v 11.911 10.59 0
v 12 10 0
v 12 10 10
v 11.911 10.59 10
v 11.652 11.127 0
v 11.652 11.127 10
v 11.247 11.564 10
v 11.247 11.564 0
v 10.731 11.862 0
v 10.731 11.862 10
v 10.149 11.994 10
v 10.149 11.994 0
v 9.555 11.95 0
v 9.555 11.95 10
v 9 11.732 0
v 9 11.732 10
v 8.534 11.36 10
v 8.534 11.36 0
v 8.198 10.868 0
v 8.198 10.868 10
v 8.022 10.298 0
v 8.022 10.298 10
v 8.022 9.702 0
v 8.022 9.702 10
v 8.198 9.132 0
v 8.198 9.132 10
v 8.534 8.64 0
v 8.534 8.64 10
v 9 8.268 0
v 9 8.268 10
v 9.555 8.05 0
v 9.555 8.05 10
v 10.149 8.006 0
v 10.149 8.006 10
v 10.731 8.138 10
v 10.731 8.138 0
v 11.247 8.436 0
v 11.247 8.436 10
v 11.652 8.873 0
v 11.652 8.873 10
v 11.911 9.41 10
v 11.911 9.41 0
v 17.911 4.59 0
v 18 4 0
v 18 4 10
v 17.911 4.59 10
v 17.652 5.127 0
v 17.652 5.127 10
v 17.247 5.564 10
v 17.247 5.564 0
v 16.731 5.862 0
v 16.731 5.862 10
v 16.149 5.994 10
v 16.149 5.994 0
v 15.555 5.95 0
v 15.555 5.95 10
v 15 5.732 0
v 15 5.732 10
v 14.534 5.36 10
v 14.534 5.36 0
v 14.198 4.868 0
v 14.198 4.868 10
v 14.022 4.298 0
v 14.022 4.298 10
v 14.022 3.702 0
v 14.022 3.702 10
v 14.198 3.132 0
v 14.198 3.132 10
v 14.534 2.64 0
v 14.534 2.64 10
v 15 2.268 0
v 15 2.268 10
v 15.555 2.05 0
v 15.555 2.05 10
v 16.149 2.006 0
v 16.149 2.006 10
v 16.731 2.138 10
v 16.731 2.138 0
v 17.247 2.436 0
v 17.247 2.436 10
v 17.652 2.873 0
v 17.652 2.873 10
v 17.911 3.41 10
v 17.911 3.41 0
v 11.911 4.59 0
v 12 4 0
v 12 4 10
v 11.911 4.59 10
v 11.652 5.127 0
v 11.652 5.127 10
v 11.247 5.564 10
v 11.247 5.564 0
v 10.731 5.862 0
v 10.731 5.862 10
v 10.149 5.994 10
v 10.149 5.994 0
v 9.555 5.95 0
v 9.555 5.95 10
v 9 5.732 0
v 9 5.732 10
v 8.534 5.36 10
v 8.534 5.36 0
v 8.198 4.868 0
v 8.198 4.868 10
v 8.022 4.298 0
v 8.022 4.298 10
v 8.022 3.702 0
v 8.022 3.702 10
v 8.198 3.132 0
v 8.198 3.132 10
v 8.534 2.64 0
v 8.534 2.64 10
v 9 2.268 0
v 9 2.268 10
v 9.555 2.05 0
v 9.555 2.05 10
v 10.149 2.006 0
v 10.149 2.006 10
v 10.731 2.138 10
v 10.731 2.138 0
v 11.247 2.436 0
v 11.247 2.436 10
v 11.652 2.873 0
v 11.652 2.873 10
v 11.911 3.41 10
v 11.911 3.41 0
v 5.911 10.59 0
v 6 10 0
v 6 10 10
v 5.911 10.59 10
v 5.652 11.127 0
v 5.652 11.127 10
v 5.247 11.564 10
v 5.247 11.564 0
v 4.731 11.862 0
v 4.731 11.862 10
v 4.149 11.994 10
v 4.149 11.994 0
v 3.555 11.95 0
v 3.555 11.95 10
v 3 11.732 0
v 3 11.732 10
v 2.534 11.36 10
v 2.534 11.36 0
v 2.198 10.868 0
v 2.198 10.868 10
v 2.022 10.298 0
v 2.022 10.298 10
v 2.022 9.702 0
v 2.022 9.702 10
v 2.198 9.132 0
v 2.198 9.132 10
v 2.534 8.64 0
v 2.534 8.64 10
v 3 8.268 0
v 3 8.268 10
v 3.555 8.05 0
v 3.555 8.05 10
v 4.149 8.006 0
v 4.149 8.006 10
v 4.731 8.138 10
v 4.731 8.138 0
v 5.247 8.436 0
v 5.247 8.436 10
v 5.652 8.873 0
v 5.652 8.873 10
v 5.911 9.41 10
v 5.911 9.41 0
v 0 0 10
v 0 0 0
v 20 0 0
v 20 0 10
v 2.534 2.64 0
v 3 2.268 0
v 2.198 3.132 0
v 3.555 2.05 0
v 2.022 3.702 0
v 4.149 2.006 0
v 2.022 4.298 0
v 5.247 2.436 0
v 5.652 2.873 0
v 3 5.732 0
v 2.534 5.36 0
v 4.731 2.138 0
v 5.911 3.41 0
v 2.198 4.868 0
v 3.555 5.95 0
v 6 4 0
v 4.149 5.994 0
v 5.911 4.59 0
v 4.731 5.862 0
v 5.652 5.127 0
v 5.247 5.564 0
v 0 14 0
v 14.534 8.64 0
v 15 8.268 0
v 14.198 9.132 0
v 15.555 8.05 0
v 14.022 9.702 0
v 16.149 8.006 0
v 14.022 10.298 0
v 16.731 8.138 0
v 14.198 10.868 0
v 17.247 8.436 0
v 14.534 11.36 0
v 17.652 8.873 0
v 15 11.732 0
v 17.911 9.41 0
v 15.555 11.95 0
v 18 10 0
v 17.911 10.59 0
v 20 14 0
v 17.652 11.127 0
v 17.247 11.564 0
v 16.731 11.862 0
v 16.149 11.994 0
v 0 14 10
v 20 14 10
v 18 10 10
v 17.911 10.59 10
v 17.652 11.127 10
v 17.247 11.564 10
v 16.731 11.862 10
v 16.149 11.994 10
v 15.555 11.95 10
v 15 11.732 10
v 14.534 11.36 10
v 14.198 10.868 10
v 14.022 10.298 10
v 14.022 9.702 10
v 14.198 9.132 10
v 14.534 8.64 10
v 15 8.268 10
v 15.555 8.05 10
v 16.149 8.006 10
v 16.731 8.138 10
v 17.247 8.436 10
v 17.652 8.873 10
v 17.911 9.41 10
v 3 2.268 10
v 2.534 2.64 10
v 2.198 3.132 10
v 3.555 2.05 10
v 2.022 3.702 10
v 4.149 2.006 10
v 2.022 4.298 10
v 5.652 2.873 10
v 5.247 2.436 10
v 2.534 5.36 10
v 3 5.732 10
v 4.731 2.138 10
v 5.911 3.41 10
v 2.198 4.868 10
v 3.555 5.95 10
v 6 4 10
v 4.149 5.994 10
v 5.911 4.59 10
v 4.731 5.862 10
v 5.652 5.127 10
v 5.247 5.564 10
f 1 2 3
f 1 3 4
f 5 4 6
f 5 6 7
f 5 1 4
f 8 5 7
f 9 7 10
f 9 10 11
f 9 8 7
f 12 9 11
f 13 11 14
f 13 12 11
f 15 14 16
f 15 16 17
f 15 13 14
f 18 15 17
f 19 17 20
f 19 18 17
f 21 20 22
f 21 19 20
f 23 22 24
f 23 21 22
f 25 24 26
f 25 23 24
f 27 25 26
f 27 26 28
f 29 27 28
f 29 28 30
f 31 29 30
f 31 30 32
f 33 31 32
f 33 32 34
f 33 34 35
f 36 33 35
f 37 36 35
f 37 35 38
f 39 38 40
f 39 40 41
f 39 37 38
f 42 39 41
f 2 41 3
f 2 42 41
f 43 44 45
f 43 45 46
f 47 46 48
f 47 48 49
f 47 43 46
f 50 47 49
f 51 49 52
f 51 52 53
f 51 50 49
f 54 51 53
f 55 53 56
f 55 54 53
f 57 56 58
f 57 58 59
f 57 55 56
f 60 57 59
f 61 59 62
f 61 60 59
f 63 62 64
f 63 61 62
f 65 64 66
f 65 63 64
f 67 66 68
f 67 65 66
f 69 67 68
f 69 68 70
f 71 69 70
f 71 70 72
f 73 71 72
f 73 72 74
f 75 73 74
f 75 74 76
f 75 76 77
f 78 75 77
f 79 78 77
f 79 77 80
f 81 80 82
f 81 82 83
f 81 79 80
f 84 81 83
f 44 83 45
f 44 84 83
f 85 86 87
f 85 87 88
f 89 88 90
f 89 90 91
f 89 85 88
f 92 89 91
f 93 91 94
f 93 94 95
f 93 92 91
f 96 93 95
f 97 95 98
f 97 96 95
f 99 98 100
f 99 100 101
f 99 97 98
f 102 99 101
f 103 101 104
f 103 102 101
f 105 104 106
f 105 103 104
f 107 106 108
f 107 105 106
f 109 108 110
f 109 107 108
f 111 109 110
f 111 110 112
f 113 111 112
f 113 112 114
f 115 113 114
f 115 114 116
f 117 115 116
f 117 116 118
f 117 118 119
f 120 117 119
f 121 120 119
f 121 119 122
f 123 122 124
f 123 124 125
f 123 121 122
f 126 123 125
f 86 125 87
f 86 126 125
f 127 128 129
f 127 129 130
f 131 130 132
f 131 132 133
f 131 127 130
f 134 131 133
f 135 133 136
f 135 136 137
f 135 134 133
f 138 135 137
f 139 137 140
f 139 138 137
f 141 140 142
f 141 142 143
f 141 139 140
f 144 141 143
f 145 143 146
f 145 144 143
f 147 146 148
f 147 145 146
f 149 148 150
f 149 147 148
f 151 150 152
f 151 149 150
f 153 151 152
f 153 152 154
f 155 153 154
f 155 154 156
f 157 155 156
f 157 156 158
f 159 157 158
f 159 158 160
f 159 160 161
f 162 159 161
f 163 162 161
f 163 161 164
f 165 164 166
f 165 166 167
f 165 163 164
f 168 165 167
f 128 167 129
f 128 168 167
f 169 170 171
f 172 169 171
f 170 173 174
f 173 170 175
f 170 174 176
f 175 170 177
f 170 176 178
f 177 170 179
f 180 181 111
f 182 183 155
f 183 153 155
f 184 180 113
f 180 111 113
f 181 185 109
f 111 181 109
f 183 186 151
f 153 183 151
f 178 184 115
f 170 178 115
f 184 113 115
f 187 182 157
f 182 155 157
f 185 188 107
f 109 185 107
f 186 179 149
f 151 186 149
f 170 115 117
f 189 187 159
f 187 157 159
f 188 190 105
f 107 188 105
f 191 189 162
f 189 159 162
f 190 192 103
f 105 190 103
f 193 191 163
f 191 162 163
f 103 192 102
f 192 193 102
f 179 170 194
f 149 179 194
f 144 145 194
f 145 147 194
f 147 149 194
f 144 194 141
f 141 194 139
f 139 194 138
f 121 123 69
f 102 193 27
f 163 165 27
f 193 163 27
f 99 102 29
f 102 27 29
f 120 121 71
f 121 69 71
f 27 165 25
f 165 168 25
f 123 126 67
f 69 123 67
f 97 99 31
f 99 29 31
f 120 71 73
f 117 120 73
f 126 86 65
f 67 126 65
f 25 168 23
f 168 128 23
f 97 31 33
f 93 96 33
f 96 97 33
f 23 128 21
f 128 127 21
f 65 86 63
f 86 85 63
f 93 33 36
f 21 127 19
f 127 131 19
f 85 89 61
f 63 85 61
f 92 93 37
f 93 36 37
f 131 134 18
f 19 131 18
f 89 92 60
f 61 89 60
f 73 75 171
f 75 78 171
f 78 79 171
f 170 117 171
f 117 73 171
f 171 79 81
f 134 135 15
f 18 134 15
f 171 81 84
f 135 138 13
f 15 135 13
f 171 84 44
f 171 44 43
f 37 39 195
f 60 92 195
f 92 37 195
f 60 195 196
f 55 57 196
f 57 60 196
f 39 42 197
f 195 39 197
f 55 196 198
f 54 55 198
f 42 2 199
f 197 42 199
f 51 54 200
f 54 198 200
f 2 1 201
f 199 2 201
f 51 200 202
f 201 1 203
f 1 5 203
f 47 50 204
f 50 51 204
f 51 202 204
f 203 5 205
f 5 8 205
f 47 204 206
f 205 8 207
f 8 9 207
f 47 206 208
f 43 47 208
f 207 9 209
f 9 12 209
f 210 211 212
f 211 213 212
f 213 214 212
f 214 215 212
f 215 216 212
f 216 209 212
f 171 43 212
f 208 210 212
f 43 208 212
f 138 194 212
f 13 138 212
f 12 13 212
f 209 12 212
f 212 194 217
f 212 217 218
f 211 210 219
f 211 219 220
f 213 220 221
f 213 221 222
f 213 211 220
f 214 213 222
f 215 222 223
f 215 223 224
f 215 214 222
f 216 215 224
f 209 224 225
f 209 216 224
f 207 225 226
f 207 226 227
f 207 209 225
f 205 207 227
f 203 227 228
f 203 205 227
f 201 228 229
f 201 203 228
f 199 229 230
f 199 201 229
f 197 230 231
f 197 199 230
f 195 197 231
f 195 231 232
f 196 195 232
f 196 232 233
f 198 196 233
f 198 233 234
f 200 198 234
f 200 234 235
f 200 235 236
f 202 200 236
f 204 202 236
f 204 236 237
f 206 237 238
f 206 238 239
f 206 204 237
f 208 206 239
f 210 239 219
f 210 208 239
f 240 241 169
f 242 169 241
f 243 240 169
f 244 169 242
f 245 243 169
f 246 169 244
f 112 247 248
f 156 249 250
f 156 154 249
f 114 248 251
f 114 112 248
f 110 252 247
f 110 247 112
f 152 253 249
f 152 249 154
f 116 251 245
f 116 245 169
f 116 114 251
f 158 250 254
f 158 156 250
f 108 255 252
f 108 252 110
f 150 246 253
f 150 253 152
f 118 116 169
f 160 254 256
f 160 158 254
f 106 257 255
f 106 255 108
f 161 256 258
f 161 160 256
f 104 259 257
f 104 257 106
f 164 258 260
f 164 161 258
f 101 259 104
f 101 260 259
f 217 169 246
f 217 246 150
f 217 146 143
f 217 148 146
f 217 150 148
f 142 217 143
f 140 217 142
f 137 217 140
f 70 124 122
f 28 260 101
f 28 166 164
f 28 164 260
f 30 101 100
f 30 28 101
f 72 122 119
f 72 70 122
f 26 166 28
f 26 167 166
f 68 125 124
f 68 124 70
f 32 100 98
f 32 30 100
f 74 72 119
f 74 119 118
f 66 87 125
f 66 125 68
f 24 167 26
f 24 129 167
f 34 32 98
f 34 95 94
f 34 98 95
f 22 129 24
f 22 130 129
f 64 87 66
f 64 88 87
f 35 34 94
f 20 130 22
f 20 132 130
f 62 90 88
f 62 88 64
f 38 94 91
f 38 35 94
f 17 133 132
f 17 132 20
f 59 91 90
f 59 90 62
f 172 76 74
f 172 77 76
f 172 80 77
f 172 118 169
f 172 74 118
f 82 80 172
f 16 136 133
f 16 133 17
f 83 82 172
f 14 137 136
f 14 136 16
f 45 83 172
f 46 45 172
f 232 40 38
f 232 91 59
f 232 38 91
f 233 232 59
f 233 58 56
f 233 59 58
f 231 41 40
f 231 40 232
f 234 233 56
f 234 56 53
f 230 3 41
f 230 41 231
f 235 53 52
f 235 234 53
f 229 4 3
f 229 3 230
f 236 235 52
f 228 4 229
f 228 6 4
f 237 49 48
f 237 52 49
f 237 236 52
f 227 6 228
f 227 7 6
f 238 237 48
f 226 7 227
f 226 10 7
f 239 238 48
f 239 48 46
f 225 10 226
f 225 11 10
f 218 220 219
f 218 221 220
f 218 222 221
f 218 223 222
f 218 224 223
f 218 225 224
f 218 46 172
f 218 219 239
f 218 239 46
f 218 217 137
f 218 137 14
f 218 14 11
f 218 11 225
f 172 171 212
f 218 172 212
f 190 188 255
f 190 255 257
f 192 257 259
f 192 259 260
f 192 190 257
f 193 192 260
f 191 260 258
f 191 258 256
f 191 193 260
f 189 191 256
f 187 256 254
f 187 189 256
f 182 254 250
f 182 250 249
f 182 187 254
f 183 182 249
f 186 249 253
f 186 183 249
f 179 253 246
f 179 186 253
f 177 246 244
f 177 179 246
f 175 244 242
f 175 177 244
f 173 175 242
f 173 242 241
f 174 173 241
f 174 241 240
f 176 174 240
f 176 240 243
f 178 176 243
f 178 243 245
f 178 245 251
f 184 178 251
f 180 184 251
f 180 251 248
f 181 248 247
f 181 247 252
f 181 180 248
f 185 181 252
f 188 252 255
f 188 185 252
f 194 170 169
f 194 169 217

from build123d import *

# Parameters (mm, degrees)
CYLINDER005_R     = 2
CYLINDER005_DEPTH = 10
CYLINDER004_R     = 2
CYLINDER004_DEPTH = 10
CYLINDER003_R     = 2
CYLINDER003_DEPTH = 10
CYLINDER002_R     = 2
CYLINDER002_DEPTH = 10
CYLINDER001_R     = 2
CYLINDER001_DEPTH = 10
CYLINDER_R        = 2
CYLINDER_DEPTH    = 10
BOX_W             = 20
BOX_H             = 14
BOX_DEPTH         = 10


with BuildPart() as cilindro005:
    # Cylinder005 → Cylinder005 (new body)
    with BuildSketch(Plane(origin=(16, 10, 0), x_dir=(1, 0, 0), z_dir=(0, 0, 1))):
        Circle(CYLINDER005_R)
    extrude(amount=CYLINDER005_DEPTH)


with BuildPart() as cilindro004:
    # Cylinder004 → Cylinder004 (new body)
    with BuildSketch(Plane(origin=(16, 4, 0), x_dir=(1, 0, 0), z_dir=(0, 0, 1))):
        Circle(CYLINDER004_R)
    extrude(amount=CYLINDER004_DEPTH)


with BuildPart() as cilindro003:
    # Cylinder003 → Cylinder003 (new body)
    with BuildSketch(Plane(origin=(10, 10, 0), x_dir=(1, 0, 0), z_dir=(0, 0, 1))):
        Circle(CYLINDER003_R)
    extrude(amount=CYLINDER003_DEPTH)


with BuildPart() as cilindro002:
    # Cylinder002 → Cylinder002 (new body)
    with BuildSketch(Plane(origin=(10, 4, 0), x_dir=(1, 0, 0), z_dir=(0, 0, 1))):
        Circle(CYLINDER002_R)
    extrude(amount=CYLINDER002_DEPTH)


with BuildPart() as cilindro001:
    # Cylinder001 → Cylinder001 (new body)
    with BuildSketch(Plane(origin=(4, 10, 0), x_dir=(1, 0, 0), z_dir=(0, 0, 1))):
        Circle(CYLINDER001_R)
    extrude(amount=CYLINDER001_DEPTH)


with BuildPart() as cilindro:
    # Cylinder → Cylinder (new body)
    with BuildSketch(Plane(origin=(4, 4, 0), x_dir=(1, 0, 0), z_dir=(0, 0, 1))):
        Circle(CYLINDER_R)
    extrude(amount=CYLINDER_DEPTH)


with BuildPart() as cut005:
    # Box → Box (new body)
    with BuildSketch(Plane.XY):
        with Locations((10, 7)):
            Rectangle(BOX_W, BOX_H)
    extrude(amount=BOX_DEPTH)

    # Cut: cut Cilindro
    add(cilindro.part, mode=Mode.SUBTRACT)

    # Cut001: cut Cilindro001
    add(cilindro001.part, mode=Mode.SUBTRACT)

    # Cut002: cut Cilindro002
    add(cilindro002.part, mode=Mode.SUBTRACT)

    # Cut003: cut Cilindro003
    add(cilindro003.part, mode=Mode.SUBTRACT)

    # Cut004: cut Cilindro004
    add(cilindro004.part, mode=Mode.SUBTRACT)

    # Cut005: cut Cilindro005
    add(cilindro005.part, mode=Mode.SUBTRACT)


solid = cut005.part
